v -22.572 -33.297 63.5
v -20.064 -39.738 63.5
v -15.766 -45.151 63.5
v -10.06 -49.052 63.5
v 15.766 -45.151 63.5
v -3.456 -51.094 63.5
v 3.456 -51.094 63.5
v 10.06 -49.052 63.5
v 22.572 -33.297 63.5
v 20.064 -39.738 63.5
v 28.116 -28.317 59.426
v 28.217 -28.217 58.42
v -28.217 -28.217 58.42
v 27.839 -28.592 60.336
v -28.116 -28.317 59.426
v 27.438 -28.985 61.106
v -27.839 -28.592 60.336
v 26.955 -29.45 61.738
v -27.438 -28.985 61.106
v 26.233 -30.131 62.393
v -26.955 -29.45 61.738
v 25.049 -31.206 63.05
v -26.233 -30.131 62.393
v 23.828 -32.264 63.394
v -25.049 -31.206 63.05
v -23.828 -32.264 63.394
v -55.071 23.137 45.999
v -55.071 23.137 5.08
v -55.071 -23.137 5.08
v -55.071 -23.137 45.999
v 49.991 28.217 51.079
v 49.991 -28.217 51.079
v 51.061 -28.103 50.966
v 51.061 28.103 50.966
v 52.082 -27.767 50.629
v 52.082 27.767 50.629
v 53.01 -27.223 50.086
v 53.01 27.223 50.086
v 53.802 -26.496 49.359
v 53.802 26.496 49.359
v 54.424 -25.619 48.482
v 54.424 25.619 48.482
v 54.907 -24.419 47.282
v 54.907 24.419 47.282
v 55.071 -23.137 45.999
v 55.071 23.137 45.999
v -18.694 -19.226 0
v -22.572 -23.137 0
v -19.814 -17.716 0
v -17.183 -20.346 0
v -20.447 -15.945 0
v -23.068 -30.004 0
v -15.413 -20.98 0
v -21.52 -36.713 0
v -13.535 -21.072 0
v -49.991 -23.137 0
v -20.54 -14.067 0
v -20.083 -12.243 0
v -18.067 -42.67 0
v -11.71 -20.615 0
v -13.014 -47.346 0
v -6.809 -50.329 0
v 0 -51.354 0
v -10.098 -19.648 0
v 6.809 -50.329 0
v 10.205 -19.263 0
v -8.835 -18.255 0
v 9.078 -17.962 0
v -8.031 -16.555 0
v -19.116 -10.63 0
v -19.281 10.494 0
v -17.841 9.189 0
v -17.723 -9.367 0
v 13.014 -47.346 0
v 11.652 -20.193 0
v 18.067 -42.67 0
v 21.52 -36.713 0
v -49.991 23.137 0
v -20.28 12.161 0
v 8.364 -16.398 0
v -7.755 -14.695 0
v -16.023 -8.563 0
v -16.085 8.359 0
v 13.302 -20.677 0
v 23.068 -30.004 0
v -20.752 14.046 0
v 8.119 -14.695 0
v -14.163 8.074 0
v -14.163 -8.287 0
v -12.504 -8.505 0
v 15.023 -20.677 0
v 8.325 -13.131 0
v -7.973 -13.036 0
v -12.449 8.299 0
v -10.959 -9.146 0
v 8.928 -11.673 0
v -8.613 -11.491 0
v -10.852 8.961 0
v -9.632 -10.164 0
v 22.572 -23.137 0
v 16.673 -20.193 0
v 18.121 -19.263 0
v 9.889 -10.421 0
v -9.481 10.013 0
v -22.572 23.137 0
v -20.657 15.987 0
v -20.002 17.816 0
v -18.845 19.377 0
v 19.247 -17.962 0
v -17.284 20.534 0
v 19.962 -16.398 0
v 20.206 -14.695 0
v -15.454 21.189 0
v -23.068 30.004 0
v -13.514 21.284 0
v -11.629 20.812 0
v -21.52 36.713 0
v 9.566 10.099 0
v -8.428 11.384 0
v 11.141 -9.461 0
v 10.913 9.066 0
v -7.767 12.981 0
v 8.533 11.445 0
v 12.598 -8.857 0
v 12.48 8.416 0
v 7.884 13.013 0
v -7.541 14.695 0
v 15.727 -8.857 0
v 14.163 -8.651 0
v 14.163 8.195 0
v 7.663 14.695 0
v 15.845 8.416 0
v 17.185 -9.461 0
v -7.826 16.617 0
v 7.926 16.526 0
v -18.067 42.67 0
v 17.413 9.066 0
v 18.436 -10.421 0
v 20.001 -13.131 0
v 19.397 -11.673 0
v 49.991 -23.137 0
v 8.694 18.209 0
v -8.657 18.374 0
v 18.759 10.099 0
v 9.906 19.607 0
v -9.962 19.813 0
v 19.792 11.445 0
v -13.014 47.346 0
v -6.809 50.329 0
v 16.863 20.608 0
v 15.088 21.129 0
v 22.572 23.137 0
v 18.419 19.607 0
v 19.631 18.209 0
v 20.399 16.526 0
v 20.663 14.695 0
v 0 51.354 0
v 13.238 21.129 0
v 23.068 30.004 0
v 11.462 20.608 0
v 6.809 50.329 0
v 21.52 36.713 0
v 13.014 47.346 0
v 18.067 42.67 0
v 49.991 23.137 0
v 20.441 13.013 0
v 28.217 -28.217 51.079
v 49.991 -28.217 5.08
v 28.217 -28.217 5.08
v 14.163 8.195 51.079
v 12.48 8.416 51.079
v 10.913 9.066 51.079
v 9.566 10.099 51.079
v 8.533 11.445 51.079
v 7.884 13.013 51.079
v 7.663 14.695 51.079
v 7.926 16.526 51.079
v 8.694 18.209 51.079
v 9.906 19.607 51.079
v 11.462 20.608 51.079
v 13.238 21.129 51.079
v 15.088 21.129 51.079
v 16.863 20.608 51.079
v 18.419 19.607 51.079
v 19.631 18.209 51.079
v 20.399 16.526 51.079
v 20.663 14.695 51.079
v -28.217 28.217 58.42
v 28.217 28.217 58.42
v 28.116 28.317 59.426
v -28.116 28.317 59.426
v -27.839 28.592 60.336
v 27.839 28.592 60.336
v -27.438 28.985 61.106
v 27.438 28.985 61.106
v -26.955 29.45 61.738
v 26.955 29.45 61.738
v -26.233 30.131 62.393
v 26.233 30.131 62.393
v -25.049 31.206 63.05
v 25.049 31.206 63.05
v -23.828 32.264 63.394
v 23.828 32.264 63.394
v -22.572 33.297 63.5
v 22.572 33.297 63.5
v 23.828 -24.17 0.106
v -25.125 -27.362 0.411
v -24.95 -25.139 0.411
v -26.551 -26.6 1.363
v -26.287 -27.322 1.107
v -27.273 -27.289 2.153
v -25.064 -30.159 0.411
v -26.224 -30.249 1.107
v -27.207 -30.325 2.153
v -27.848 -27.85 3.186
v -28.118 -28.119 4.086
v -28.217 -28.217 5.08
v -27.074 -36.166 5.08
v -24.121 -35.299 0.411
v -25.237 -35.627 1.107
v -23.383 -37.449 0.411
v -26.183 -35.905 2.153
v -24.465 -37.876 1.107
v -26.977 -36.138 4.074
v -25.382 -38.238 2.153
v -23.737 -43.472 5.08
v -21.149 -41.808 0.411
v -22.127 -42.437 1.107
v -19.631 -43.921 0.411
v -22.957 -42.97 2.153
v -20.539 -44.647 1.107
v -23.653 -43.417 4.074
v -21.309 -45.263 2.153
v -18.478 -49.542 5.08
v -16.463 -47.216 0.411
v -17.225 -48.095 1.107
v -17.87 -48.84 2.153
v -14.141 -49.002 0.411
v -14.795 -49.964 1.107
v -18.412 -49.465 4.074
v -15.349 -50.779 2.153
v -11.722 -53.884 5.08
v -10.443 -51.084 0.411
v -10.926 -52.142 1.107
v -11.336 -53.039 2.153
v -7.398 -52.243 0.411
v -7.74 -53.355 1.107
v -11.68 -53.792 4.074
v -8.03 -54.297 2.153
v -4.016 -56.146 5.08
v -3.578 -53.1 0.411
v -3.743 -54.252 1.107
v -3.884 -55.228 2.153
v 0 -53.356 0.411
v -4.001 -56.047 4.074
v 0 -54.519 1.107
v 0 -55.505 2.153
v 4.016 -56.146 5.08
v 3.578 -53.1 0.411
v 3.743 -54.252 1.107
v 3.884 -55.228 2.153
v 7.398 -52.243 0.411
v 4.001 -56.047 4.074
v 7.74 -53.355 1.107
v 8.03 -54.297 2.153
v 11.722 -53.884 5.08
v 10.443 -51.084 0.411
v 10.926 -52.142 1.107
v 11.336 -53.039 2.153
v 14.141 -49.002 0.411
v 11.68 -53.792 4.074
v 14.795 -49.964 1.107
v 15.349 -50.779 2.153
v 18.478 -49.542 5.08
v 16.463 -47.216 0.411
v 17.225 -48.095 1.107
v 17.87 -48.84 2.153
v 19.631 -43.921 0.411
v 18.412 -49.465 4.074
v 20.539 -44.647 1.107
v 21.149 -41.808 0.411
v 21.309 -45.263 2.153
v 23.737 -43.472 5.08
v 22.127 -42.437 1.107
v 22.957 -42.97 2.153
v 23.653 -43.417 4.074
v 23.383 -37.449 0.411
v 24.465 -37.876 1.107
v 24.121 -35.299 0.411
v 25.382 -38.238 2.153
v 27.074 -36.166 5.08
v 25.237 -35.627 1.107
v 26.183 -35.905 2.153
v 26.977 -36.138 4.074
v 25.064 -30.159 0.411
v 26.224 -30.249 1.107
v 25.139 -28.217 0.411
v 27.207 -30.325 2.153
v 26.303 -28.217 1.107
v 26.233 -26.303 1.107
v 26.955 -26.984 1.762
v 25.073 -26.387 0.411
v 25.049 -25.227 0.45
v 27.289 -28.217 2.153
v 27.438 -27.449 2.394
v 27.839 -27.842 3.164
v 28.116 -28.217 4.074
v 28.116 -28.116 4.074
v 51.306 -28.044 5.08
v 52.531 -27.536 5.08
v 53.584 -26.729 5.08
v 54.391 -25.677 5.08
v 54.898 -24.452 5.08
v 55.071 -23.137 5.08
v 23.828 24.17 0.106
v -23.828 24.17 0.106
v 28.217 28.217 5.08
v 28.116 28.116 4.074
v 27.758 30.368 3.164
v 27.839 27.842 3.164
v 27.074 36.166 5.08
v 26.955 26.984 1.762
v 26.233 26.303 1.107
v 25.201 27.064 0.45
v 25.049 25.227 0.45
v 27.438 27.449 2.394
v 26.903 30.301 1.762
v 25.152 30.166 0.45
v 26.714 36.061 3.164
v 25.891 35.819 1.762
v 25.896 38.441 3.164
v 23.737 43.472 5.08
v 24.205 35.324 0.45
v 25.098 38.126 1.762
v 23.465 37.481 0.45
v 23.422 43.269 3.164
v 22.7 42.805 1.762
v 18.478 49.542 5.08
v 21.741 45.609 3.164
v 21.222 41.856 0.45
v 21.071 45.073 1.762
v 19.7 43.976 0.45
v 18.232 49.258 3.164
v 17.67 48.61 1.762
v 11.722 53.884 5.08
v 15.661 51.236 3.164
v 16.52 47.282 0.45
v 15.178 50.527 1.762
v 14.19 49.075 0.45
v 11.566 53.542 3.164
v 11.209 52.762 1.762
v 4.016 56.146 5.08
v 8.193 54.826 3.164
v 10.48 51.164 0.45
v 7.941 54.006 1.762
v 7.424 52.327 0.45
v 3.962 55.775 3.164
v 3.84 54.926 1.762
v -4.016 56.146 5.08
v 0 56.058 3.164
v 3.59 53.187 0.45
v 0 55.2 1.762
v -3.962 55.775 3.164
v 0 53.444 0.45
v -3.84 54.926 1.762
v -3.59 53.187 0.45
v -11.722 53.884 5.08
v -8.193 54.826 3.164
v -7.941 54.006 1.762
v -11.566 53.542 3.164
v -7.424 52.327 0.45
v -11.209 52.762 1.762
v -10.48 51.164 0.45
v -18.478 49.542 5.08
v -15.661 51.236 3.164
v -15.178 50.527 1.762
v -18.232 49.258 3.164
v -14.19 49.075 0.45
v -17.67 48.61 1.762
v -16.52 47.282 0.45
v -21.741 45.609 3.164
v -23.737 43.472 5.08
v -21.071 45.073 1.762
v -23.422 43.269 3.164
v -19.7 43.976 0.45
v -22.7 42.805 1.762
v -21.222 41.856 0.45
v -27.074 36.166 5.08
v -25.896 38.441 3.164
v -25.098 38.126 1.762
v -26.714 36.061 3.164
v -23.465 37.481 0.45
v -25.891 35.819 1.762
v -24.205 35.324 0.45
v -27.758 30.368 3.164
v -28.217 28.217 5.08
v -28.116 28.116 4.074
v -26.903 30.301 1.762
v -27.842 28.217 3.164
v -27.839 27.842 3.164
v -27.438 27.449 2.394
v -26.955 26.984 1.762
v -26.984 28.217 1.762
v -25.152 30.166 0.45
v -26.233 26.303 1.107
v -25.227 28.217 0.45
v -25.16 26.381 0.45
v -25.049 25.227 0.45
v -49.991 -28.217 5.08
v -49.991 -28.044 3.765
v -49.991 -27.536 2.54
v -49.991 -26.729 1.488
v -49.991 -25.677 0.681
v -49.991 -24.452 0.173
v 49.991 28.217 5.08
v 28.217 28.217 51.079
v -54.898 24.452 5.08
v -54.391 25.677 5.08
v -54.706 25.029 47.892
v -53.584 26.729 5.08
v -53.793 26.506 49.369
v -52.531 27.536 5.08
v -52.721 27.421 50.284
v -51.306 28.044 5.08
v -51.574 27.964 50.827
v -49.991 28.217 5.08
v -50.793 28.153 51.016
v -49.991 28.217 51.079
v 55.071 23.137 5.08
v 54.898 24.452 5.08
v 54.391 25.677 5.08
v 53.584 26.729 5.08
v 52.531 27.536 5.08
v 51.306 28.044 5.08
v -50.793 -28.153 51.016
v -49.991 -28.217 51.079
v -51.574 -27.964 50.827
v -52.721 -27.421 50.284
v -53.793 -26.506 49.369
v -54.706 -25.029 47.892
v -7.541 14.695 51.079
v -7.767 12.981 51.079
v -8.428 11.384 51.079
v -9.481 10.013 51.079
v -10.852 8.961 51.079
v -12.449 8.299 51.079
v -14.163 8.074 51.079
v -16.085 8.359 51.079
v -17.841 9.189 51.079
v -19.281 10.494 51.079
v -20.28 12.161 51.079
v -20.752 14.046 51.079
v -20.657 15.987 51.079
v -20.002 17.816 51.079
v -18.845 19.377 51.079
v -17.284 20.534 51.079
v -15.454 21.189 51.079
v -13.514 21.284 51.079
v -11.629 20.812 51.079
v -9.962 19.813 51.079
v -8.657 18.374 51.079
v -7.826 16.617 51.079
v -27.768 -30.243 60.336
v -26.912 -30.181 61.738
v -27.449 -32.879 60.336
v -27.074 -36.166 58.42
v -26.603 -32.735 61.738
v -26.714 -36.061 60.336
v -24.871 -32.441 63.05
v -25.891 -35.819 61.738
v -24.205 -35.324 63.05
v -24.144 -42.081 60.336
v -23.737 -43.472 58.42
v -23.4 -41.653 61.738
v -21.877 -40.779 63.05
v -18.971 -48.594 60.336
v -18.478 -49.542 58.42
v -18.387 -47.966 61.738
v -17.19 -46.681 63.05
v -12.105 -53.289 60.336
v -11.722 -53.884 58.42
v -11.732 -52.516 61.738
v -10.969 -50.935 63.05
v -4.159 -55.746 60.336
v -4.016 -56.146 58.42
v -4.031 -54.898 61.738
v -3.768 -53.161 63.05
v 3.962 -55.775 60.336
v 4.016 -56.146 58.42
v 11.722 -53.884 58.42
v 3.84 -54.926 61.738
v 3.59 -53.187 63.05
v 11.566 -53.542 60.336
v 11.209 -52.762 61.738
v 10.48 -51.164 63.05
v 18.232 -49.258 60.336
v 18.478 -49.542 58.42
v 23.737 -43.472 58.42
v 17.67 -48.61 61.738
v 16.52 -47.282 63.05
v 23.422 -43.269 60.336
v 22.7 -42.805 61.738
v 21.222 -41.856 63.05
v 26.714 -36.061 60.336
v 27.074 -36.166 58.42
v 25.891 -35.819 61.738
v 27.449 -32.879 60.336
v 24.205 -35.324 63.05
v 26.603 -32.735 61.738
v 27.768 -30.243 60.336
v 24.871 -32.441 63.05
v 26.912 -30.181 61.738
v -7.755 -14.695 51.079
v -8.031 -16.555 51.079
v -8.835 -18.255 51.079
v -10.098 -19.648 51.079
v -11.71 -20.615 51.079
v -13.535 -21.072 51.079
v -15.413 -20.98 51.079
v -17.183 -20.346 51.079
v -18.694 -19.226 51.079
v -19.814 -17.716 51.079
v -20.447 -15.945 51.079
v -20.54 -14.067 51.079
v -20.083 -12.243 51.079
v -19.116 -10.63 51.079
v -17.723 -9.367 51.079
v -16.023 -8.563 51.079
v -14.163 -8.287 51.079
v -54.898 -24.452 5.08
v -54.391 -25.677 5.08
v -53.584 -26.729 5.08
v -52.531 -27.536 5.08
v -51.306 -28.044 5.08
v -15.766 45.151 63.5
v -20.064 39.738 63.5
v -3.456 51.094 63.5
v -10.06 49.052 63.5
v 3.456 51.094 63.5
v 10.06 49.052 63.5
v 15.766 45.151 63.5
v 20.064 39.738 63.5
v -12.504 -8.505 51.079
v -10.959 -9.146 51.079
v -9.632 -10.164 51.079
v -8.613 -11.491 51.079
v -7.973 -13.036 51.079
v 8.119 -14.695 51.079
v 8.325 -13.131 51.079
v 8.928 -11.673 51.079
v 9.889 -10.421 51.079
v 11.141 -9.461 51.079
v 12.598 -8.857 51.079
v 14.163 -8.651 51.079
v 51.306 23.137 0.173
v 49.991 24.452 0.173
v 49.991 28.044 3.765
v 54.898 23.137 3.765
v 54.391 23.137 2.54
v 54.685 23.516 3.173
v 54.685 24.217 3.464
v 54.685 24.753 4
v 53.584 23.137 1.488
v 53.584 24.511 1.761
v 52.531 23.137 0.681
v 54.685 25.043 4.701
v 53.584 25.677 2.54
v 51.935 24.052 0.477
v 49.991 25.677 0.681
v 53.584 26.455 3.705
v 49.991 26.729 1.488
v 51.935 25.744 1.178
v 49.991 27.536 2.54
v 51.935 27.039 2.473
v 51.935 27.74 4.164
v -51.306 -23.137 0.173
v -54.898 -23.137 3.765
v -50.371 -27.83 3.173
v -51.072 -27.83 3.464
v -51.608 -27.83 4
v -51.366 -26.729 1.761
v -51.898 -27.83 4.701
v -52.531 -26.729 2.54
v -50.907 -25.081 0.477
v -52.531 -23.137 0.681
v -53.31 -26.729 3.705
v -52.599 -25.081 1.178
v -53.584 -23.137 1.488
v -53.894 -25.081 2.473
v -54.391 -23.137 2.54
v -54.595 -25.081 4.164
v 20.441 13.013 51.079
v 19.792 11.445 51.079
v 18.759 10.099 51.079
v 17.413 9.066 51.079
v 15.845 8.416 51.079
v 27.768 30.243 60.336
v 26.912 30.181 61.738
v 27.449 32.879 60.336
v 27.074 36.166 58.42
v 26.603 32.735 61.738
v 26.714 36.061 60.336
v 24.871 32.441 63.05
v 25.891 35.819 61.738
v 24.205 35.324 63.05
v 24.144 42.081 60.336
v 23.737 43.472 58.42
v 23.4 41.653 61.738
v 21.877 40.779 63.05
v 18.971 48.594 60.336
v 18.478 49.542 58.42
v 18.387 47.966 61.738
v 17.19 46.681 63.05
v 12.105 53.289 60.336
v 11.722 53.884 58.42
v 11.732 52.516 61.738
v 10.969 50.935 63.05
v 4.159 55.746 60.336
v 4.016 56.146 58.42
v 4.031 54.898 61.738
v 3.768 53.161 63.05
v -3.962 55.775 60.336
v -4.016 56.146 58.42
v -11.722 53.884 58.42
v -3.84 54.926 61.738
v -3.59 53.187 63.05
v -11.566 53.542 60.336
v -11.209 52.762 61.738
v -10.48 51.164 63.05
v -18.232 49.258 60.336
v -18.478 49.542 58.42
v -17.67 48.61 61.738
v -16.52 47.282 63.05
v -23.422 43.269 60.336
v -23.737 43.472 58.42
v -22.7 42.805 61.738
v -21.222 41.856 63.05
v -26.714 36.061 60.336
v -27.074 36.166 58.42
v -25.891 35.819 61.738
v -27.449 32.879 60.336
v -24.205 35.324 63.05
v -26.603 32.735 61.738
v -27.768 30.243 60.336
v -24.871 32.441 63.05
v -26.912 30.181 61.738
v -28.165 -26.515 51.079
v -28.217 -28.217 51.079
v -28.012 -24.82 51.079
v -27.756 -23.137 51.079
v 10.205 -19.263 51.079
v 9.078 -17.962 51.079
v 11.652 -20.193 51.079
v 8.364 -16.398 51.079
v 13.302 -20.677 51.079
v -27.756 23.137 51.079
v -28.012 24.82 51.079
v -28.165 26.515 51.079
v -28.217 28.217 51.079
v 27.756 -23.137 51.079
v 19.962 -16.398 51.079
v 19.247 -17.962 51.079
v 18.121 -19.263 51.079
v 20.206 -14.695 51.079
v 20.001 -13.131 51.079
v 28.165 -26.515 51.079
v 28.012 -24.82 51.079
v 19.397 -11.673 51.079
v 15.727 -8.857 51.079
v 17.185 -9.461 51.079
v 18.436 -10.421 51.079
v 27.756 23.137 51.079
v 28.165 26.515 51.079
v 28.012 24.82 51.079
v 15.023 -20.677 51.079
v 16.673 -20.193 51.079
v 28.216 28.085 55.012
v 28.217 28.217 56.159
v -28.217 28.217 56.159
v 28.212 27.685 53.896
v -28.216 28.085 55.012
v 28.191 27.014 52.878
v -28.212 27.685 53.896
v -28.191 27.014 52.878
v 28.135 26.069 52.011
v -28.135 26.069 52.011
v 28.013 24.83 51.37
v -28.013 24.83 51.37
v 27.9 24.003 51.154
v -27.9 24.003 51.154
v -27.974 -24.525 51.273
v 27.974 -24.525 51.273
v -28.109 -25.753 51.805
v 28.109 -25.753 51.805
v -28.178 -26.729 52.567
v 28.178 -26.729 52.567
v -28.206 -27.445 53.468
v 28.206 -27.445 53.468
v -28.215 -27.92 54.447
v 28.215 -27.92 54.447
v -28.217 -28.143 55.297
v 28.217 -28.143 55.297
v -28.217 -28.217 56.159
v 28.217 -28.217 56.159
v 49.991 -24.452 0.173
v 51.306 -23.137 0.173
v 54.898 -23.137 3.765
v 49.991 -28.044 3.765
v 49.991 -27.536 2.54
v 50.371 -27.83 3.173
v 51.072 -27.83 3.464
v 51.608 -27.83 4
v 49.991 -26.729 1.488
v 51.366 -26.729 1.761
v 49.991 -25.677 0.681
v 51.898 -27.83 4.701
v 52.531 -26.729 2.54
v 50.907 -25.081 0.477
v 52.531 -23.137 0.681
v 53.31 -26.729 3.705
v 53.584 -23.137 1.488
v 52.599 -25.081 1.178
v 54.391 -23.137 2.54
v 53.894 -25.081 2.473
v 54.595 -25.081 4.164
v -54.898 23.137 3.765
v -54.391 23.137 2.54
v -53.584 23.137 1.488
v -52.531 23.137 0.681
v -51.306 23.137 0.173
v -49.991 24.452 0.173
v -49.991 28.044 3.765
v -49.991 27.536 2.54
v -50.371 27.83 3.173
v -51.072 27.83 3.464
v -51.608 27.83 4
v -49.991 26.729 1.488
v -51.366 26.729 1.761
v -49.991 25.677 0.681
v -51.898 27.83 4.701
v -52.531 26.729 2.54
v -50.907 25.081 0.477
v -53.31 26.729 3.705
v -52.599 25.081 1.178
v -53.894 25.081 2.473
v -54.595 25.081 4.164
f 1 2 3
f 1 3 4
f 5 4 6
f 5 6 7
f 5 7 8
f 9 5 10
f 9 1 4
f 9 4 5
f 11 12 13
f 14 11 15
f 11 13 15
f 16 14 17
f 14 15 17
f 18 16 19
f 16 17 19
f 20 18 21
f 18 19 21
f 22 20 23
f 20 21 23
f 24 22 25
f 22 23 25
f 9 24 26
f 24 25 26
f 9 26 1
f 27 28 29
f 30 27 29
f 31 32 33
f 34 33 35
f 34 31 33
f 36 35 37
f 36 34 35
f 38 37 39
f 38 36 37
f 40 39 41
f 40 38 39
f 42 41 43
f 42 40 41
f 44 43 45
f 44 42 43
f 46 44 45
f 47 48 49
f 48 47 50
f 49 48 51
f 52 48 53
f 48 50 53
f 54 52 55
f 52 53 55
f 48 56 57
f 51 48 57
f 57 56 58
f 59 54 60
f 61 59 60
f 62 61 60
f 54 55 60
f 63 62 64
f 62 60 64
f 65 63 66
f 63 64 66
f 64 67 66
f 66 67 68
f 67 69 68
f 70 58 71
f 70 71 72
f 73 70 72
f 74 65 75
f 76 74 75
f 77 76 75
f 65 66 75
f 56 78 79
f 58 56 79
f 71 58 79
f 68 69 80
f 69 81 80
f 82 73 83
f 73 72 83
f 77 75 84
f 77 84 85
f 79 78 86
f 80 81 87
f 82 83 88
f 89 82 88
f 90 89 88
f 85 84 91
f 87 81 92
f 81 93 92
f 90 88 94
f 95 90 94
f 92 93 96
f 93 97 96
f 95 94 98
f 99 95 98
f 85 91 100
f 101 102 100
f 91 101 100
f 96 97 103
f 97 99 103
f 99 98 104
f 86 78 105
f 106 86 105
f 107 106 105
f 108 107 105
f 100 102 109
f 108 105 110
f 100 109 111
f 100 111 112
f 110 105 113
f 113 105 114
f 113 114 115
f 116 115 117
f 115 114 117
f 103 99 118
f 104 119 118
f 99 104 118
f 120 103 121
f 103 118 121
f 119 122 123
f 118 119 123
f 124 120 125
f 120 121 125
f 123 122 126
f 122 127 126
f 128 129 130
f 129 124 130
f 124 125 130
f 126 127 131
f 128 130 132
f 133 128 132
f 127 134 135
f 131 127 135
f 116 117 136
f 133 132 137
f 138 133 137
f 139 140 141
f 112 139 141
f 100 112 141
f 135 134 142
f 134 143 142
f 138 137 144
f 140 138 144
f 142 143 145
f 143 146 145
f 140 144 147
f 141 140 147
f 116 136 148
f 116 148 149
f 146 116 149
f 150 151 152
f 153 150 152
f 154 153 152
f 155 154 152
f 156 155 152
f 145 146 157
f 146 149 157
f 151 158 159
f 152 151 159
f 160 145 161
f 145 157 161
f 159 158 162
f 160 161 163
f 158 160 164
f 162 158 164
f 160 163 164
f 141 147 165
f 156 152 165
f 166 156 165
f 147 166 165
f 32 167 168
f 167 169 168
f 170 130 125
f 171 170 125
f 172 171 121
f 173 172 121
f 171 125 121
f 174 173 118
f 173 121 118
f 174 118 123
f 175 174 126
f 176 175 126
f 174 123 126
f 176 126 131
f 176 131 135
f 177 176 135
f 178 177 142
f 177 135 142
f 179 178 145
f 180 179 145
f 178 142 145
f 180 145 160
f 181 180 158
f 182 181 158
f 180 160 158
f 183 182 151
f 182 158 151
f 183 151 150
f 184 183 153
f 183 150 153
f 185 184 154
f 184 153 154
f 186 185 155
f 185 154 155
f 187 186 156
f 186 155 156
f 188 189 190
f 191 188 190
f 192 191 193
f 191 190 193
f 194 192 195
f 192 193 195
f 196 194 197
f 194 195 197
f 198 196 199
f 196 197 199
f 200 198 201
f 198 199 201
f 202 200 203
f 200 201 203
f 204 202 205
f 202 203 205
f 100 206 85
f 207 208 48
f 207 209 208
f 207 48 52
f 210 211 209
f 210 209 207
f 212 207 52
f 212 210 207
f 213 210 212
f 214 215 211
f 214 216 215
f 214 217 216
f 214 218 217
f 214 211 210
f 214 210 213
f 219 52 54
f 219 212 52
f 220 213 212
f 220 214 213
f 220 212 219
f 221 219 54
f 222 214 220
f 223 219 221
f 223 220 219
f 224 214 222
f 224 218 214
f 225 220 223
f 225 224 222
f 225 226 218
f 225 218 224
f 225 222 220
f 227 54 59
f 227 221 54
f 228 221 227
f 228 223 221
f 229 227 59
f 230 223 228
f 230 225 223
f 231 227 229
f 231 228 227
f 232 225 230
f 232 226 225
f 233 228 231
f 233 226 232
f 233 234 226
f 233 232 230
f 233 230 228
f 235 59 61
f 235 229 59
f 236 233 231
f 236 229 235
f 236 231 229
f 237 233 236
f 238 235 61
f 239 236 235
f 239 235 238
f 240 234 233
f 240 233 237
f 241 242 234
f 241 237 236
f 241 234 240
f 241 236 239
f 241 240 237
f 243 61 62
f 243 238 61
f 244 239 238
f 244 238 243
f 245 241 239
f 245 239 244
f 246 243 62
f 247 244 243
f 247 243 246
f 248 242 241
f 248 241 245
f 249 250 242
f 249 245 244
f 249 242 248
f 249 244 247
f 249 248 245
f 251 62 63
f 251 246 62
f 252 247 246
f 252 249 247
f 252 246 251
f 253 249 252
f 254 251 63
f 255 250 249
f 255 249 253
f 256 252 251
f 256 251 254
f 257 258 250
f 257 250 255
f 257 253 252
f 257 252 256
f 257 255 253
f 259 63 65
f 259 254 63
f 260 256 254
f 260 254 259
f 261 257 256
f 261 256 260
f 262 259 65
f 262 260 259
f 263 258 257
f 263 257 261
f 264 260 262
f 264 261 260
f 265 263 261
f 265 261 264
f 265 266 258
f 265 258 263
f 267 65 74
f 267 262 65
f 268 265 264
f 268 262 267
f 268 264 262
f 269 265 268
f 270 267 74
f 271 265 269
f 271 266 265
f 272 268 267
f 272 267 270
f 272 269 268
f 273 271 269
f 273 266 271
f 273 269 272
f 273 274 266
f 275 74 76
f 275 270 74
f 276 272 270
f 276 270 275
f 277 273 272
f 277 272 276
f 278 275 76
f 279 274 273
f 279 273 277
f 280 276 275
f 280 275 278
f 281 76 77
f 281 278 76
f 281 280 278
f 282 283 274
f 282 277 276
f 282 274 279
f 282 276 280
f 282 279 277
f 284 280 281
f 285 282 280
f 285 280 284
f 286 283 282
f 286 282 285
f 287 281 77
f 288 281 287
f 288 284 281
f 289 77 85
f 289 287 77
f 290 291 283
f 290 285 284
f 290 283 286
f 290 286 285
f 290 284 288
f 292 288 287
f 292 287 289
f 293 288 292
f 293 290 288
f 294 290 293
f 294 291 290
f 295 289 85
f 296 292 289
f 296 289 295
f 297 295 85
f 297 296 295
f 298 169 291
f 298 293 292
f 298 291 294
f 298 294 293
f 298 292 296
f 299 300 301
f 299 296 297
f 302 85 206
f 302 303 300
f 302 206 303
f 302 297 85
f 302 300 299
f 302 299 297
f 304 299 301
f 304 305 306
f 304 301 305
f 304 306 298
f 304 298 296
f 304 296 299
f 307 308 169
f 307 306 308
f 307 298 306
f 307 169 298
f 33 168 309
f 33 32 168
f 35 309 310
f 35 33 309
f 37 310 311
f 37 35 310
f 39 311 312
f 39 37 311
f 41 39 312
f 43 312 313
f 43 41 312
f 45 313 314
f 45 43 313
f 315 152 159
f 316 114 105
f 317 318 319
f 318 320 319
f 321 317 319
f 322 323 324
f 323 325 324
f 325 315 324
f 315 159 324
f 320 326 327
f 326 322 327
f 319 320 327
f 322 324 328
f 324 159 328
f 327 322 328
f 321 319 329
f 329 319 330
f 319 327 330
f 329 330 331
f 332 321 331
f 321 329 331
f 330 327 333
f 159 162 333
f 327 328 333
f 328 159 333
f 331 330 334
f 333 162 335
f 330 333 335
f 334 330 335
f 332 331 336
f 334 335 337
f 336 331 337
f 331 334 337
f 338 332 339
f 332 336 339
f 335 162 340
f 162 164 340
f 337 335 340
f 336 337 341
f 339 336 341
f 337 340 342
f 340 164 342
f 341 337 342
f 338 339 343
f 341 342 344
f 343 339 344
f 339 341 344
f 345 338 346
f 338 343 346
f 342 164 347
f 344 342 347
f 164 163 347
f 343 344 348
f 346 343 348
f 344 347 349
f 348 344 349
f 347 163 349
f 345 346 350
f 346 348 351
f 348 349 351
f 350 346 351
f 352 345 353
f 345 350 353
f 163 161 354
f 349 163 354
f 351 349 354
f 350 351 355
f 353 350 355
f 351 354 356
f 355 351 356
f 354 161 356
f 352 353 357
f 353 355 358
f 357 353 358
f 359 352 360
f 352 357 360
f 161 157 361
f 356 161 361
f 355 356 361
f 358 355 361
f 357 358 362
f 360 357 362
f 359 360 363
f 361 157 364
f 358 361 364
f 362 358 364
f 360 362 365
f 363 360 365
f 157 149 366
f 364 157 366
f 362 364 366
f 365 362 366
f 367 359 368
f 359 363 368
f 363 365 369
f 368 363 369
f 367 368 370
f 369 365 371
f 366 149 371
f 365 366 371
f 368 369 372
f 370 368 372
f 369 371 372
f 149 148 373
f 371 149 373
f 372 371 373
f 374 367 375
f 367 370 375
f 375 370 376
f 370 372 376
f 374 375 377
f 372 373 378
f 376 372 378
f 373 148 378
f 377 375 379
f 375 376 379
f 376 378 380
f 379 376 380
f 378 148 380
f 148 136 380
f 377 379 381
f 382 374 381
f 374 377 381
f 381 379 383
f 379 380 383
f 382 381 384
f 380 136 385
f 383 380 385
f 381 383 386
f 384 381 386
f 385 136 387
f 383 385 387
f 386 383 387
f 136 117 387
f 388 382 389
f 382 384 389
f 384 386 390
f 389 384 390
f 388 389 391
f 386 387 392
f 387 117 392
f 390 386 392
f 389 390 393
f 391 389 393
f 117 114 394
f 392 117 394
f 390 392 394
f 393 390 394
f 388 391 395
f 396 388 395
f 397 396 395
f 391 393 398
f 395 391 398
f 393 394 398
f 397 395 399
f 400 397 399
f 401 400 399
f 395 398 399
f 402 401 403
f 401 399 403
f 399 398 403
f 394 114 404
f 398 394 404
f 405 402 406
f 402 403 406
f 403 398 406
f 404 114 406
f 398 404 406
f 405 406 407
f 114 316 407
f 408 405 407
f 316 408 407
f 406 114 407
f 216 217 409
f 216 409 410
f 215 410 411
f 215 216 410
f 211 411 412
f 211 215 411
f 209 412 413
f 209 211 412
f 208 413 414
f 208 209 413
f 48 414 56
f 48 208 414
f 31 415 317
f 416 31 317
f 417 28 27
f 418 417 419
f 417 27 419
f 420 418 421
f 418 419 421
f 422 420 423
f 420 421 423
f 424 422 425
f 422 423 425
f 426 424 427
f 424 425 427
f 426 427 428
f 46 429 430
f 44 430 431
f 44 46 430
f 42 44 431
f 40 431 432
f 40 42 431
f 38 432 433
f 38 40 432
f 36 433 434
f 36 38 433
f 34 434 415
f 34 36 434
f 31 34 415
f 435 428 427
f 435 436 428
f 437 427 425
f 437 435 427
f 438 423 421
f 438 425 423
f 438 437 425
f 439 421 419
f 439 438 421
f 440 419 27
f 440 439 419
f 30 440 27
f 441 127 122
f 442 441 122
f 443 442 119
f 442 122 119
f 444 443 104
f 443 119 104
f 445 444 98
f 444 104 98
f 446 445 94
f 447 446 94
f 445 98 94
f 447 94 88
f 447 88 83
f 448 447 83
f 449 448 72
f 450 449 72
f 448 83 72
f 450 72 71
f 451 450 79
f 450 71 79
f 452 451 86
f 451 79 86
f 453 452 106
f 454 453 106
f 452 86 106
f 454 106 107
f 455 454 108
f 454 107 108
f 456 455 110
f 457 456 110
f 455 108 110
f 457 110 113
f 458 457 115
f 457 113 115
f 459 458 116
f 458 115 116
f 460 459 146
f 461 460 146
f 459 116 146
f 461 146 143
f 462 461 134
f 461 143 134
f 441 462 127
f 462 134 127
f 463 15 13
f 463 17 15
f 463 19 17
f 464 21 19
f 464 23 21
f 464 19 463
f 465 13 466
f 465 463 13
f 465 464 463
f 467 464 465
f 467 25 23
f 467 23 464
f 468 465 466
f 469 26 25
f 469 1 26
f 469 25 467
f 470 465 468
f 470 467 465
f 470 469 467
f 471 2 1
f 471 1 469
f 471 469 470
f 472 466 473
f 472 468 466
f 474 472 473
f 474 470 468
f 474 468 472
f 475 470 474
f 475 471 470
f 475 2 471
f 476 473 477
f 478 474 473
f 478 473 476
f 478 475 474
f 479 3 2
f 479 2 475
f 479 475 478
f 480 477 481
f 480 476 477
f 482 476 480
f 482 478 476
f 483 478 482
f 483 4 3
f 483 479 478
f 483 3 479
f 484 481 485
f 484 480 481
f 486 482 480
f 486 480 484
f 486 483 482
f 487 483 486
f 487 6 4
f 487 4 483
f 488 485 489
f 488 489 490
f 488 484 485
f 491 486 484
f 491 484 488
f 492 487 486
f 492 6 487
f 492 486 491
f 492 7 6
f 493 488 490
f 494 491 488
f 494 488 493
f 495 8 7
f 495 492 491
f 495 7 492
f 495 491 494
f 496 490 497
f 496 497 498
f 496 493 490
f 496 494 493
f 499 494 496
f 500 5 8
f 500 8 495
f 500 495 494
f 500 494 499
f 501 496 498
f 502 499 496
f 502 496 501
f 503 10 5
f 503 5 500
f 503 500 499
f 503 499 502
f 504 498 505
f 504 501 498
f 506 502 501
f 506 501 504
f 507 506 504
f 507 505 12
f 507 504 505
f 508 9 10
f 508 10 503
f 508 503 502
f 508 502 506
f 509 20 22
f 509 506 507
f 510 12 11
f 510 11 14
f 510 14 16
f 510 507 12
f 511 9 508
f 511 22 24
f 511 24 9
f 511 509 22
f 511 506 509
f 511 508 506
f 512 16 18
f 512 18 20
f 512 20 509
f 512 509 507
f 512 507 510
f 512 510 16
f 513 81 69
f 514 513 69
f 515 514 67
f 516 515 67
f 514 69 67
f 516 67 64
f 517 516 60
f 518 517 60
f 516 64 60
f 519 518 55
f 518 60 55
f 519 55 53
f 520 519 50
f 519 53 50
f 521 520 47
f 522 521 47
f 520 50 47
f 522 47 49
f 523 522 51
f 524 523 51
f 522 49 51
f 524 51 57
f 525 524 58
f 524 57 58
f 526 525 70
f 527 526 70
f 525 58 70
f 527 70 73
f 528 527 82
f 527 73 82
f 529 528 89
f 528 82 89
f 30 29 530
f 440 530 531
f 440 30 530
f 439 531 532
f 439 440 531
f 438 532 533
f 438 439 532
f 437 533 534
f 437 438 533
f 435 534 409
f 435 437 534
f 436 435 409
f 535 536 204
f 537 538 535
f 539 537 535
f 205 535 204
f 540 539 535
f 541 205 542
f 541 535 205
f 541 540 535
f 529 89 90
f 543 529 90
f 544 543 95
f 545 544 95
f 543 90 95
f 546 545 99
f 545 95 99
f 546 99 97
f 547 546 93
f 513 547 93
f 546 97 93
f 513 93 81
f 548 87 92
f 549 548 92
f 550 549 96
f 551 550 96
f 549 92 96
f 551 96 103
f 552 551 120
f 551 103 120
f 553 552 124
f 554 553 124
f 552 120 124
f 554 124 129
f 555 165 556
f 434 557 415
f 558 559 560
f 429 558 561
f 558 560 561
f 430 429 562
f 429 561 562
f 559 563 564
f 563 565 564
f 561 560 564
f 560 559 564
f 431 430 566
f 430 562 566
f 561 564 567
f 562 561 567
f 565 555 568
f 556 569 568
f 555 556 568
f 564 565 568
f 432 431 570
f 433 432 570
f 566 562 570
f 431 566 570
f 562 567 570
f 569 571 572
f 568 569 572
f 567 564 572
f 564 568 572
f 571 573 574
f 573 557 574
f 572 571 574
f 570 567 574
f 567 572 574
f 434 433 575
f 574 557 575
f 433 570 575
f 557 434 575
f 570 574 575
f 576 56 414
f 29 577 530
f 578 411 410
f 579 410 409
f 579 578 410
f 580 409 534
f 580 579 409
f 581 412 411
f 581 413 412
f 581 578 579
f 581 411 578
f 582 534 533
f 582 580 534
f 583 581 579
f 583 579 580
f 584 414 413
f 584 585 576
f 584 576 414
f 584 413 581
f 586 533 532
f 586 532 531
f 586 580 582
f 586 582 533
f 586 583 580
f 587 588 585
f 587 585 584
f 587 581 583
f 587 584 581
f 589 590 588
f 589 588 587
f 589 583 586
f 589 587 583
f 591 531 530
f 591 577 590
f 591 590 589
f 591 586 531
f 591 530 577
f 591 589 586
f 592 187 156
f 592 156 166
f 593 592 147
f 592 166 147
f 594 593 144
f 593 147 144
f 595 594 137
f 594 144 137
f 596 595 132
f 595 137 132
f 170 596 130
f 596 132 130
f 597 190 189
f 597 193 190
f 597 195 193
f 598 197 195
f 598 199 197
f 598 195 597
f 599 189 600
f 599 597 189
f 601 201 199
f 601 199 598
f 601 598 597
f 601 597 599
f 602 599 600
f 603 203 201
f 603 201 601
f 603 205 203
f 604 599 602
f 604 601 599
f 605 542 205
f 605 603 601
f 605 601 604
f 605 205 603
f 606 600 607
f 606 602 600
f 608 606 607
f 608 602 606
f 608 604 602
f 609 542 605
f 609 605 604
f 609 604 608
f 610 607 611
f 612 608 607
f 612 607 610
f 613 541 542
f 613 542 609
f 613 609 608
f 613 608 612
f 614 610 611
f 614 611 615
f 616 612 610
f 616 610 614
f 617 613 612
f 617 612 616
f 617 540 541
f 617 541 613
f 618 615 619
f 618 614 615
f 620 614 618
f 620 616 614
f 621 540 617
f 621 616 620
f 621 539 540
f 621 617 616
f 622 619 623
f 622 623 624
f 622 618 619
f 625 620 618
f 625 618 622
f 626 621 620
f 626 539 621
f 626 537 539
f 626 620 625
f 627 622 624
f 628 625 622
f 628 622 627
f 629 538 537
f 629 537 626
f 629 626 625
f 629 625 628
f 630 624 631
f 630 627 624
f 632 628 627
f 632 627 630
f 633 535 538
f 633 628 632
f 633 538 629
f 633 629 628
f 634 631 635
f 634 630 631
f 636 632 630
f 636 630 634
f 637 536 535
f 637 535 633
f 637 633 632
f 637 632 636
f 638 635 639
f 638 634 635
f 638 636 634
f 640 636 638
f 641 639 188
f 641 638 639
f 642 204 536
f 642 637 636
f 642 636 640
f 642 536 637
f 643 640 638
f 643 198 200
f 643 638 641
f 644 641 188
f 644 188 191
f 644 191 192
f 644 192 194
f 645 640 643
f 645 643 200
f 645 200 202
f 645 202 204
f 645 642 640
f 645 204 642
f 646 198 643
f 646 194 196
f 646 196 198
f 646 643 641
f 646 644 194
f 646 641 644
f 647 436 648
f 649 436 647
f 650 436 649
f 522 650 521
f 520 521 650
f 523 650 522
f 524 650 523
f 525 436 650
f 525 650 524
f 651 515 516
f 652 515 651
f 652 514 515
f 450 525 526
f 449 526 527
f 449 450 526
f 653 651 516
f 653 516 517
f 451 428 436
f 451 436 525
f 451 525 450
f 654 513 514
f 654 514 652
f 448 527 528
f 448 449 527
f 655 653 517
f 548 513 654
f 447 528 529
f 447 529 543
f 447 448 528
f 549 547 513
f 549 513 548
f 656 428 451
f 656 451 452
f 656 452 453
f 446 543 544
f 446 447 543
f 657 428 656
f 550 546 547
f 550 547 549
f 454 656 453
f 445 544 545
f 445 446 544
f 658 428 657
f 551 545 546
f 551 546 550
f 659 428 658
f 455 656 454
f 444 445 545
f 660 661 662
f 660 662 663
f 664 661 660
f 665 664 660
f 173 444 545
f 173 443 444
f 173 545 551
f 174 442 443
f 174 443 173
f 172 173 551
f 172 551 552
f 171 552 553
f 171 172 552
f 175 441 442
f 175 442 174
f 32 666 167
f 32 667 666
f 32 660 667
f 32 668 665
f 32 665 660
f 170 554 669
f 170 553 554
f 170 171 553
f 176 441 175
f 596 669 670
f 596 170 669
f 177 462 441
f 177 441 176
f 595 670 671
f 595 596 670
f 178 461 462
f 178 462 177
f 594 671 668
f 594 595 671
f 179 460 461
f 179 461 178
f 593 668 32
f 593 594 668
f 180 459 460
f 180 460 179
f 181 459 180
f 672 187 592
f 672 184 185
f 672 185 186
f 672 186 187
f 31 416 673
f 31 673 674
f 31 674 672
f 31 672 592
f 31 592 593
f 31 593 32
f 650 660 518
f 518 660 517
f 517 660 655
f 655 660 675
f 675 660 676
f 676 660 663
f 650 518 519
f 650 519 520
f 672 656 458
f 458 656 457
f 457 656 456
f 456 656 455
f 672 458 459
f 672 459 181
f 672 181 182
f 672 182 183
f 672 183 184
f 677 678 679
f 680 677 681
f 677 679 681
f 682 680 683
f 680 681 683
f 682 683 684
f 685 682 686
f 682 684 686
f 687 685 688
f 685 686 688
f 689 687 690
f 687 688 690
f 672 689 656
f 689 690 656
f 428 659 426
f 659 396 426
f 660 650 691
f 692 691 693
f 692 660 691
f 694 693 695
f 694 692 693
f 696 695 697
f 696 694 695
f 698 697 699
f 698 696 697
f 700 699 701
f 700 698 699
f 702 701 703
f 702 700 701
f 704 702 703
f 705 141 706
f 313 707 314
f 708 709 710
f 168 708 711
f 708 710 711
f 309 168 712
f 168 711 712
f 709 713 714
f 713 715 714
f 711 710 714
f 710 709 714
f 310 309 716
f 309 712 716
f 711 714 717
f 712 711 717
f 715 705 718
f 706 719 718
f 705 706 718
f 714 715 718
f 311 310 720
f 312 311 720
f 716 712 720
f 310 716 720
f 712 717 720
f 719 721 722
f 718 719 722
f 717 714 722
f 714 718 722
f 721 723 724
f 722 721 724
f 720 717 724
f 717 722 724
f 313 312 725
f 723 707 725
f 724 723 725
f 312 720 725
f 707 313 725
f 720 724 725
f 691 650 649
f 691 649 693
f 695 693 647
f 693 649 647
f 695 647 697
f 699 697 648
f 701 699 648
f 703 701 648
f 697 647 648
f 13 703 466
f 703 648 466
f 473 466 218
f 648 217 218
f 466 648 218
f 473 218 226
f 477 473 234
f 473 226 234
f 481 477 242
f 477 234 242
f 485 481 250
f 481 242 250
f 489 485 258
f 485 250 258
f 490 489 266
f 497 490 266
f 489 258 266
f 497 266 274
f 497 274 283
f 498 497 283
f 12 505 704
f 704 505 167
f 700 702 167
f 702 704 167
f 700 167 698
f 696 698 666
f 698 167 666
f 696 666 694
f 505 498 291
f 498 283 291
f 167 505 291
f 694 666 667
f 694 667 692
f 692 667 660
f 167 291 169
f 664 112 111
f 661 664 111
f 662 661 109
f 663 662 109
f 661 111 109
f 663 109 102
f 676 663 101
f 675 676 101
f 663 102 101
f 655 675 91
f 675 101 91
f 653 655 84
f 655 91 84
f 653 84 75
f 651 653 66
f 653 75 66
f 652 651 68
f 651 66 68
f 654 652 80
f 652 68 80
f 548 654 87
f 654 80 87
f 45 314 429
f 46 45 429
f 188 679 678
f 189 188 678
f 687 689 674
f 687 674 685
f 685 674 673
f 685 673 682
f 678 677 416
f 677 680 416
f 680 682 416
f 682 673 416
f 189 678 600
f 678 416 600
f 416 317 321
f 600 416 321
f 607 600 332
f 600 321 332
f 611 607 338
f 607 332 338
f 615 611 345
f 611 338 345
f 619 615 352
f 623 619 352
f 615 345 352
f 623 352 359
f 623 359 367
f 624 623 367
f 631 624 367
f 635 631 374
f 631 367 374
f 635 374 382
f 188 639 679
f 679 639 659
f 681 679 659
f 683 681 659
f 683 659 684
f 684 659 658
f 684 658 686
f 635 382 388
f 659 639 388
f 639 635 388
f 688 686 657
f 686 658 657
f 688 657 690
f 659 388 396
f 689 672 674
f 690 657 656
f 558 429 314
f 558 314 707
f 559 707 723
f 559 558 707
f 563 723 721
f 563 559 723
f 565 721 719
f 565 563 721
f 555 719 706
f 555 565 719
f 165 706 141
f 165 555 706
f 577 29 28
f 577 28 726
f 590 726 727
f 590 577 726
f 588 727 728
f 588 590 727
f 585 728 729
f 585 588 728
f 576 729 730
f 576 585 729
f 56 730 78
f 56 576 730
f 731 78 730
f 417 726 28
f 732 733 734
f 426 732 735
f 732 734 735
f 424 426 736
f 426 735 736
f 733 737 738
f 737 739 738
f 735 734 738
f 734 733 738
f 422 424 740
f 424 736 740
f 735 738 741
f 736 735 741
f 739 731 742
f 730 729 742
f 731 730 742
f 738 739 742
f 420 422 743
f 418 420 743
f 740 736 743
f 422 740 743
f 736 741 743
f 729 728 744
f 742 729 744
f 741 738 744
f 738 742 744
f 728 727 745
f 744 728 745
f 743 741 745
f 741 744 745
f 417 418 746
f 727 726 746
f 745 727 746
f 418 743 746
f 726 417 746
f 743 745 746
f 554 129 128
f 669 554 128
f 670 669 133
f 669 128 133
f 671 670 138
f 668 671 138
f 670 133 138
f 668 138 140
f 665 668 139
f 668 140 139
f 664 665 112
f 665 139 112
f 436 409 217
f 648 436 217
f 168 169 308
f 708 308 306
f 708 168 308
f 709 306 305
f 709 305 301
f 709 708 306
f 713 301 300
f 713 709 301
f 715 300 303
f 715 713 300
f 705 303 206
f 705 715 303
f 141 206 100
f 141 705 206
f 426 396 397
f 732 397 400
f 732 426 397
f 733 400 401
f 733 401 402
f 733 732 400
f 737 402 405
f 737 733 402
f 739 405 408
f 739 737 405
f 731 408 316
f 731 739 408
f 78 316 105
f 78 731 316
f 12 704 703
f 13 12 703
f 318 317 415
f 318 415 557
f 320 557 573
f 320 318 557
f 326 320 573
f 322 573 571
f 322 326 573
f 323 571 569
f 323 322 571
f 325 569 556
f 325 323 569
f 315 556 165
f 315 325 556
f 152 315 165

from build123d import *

# Parameters (mm, degrees)
F1_DEPTH = 51.0794
F2_DEPTH = 63.5
F3_R     = 5.08


with BuildPart() as f1:
    # F0 (on Top) → F1 (new body)
    with BuildSketch(Plane.XY):
        with BuildLine():
            ThreePointArc((-14.1626298428, 3.8117302825), (-24.4520879277, 14.1355315273), (-28.2167619251, 28.2167619251))
            Line((-28.2167619251, 28.2167619251), (-55.0714641052, 28.2167619251))
            Line((-55.0714641052, 28.2167619251), (-55.0714641052, -28.2167619251))
            Line((-55.0714641052, -28.2167619251), (-28.2167619251, -28.2167619251))
            ThreePointArc((-28.2167619251, -28.2167619251), (-24.4520879277, -14.1355315273), (-14.1626298428, -3.8117302825))
            Line((-14.1626298428, -3.8117302825), (-14.1626298428, 3.8117302825))
        make_face()
        with BuildLine():
            Line((-28.2167619251, -28.2167619251), (28.2167619251, -28.2167619251))
            ThreePointArc((28.2167619251, -28.2167619251), (24.4520879277, -14.1355315273), (14.1626298428, -3.8117302825))
            Line((14.1626298428, -3.8117302825), (14.1626298428, -8.6510551789))
            ThreePointArc((14.1626298428, -8.6510551789), (18.4362835565, -10.421260508), (20.2064888856, -14.6949142218))
            ThreePointArc((20.2064888856, -14.6949142218), (14.1626298428, -20.7387732646), (8.1187707999, -14.6949142218))
            Line((8.1187707999, -14.6949142218), (-7.75476352, -14.6949142218))
            ThreePointArc((-7.75476352, -14.6949142218), (-18.6936755725, -19.2259599515), (-14.1626298428, -8.287047899))
            Line((-14.1626298428, -8.287047899), (-14.1626298428, -3.8117302825))
            ThreePointArc((-14.1626298428, -3.8117302825), (-24.4520879277, -14.1355315273), (-28.2167619251, -28.2167619251))
        make_face()
        with BuildLine():
            ThreePointArc((14.1626298428, 3.8117302825), (24.4520879277, 14.1355315273), (28.2167619251, 28.2167619251))
            Line((28.2167619251, 28.2167619251), (-28.2167619251, 28.2167619251))
            ThreePointArc((-28.2167619251, 28.2167619251), (-24.4520879277, 14.1355315273), (-14.1626298428, 3.8117302825))
            Line((-14.1626298428, 3.8117302825), (-14.1626298428, 8.0735357175))
            ThreePointArc((-14.1626298428, 8.0735357175), (-18.8446514839, 19.3769358629), (-7.5412513385, 14.6949142218))
            Line((-7.5412513385, 14.6949142218), (7.6625943184, 14.6949142218))
            ThreePointArc((7.6625943184, 14.6949142218), (14.1626298428, 21.1949497461), (20.6626653671, 14.6949142218))
            ThreePointArc((20.6626653671, 14.6949142218), (18.75884904, 10.0986950245), (14.1626298428, 8.1948786974))
            Line((14.1626298428, 8.1948786974), (14.1626298428, 3.8117302825))
        make_face()
        with BuildLine():
            Line((55.0714641052, -28.2167619251), (55.0714641052, 28.2167619251))
            Line((55.0714641052, 28.2167619251), (28.2167619251, 28.2167619251))
            ThreePointArc((28.2167619251, 28.2167619251), (24.4520879277, 14.1355315273), (14.1626298428, 3.8117302825))
            Line((14.1626298428, 3.8117302825), (14.1626298428, -3.8117302825))
            ThreePointArc((14.1626298428, -3.8117302825), (24.4520879277, -14.1355315273), (28.2167619251, -28.2167619251))
            Line((28.2167619251, -28.2167619251), (55.0714641052, -28.2167619251))
        make_face()
        with BuildLine():
            ThreePointArc((-1.8e-09, 0), (-7.3333036869, 0.9695912358), (-14.1626298428, 3.8117302825))
            Line((-14.1626298428, 3.8117302825), (-14.1626298428, -3.8117302825))
            ThreePointArc((-14.1626298428, -3.8117302825), (-7.3333036869, -0.9695912358), (-1.8e-09, 0))
        make_face()
        with BuildLine():
            Line((14.1626298428, -3.8117302825), (14.1626298428, 3.8117302825))
            ThreePointArc((14.1626298428, 3.8117302825), (7.3333036852, 0.9695912353), (-1.8e-09, 0))
            ThreePointArc((-1.8e-09, 0), (7.3333036852, -0.9695912353), (14.1626298428, -3.8117302825))
        make_face()
        with BuildLine():
            ThreePointArc((-1.8e-09, 0), (7.3333036852, 0.9695912353), (14.1626298428, 3.8117302825))
            Line((14.1626298428, 3.8117302825), (14.1626298428, 8.1948786974))
            ThreePointArc((14.1626298428, 8.1948786974), (9.5664106455, 10.0986950245), (7.6625943184, 14.6949142218))
            Line((7.6625943184, 14.6949142218), (-7.5412513385, 14.6949142218))
            ThreePointArc((-7.5412513385, 14.6949142218), (-9.4806082016, 10.0128925806), (-14.1626298428, 8.0735357175))
            Line((-14.1626298428, 8.0735357175), (-14.1626298428, 3.8117302825))
            ThreePointArc((-14.1626298428, 3.8117302825), (-7.3333036869, 0.9695912358), (-1.8e-09, 0))
        make_face()
        with BuildLine():
            ThreePointArc((14.1626298428, -3.8117302825), (7.3333036852, -0.9695912353), (-1.8e-09, 0))
            ThreePointArc((-1.8e-09, 0), (-7.3333036869, -0.9695912358), (-14.1626298428, -3.8117302825))
            Line((-14.1626298428, -3.8117302825), (-14.1626298428, -8.287047899))
            ThreePointArc((-14.1626298428, -8.287047899), (-9.631584113, -10.163868492), (-7.75476352, -14.6949142218))
            Line((-7.75476352, -14.6949142218), (8.1187707999, -14.6949142218))
            ThreePointArc((8.1187707999, -14.6949142218), (9.888976129, -10.421260508), (14.1626298428, -8.6510551789))
            Line((14.1626298428, -8.6510551789), (14.1626298428, -3.8117302825))
        make_face()
    extrude(amount=F1_DEPTH)

    # F0 (on Top) → F2 (join)
    with BuildSketch(Plane.XY):
        with BuildLine():
            Line((-28.2167619251, 28.2167619251), (28.2167619251, 28.2167619251))
            ThreePointArc((28.2167619251, 28.2167619251), (0, 56.4335238502), (-28.2167619251, 28.2167619251))
        make_face()
        with BuildLine():
            ThreePointArc((-28.2167619251, -28.2167619251), (0, -56.4335238502), (28.2167619251, -28.2167619251))
            Line((28.2167619251, -28.2167619251), (-28.2167619251, -28.2167619251))
        make_face()
    extrude(amount=F2_DEPTH)

    # F3
    f3_edges = [f1.edges().sort_by_distance(p)[0] for p in [
        (-55.071464, 0, 0),
        (-41.644113, 28.216762, 0),
        (0, 56.433524, 0),
        (41.644113, 28.216762, 0),
        (55.071464, 0, 0),
        (41.644113, -28.216762, 0),
        (0, -56.433524, 0),
        (-41.644113, -28.216762, 0),
        (0, 28.216762, 51.0794),
        (0, 28.216762, 63.5),
        (0, -28.216762, 63.5),
        (0, -28.216762, 51.0794),
        (0, -56.433524, 63.5),
        (0, 56.433524, 63.5),
        (-55.071464, -28.216762, 25.5397),
        (-55.071464, 28.216762, 25.5397),
        (-55.071464, 0, 51.0794),
        (55.071464, -28.216762, 25.5397),
        (55.071464, 0, 51.0794),
        (55.071464, 28.216762, 25.5397),
    ]]
    fillet(f3_edges, radius=F3_R)


solid = f1.part
